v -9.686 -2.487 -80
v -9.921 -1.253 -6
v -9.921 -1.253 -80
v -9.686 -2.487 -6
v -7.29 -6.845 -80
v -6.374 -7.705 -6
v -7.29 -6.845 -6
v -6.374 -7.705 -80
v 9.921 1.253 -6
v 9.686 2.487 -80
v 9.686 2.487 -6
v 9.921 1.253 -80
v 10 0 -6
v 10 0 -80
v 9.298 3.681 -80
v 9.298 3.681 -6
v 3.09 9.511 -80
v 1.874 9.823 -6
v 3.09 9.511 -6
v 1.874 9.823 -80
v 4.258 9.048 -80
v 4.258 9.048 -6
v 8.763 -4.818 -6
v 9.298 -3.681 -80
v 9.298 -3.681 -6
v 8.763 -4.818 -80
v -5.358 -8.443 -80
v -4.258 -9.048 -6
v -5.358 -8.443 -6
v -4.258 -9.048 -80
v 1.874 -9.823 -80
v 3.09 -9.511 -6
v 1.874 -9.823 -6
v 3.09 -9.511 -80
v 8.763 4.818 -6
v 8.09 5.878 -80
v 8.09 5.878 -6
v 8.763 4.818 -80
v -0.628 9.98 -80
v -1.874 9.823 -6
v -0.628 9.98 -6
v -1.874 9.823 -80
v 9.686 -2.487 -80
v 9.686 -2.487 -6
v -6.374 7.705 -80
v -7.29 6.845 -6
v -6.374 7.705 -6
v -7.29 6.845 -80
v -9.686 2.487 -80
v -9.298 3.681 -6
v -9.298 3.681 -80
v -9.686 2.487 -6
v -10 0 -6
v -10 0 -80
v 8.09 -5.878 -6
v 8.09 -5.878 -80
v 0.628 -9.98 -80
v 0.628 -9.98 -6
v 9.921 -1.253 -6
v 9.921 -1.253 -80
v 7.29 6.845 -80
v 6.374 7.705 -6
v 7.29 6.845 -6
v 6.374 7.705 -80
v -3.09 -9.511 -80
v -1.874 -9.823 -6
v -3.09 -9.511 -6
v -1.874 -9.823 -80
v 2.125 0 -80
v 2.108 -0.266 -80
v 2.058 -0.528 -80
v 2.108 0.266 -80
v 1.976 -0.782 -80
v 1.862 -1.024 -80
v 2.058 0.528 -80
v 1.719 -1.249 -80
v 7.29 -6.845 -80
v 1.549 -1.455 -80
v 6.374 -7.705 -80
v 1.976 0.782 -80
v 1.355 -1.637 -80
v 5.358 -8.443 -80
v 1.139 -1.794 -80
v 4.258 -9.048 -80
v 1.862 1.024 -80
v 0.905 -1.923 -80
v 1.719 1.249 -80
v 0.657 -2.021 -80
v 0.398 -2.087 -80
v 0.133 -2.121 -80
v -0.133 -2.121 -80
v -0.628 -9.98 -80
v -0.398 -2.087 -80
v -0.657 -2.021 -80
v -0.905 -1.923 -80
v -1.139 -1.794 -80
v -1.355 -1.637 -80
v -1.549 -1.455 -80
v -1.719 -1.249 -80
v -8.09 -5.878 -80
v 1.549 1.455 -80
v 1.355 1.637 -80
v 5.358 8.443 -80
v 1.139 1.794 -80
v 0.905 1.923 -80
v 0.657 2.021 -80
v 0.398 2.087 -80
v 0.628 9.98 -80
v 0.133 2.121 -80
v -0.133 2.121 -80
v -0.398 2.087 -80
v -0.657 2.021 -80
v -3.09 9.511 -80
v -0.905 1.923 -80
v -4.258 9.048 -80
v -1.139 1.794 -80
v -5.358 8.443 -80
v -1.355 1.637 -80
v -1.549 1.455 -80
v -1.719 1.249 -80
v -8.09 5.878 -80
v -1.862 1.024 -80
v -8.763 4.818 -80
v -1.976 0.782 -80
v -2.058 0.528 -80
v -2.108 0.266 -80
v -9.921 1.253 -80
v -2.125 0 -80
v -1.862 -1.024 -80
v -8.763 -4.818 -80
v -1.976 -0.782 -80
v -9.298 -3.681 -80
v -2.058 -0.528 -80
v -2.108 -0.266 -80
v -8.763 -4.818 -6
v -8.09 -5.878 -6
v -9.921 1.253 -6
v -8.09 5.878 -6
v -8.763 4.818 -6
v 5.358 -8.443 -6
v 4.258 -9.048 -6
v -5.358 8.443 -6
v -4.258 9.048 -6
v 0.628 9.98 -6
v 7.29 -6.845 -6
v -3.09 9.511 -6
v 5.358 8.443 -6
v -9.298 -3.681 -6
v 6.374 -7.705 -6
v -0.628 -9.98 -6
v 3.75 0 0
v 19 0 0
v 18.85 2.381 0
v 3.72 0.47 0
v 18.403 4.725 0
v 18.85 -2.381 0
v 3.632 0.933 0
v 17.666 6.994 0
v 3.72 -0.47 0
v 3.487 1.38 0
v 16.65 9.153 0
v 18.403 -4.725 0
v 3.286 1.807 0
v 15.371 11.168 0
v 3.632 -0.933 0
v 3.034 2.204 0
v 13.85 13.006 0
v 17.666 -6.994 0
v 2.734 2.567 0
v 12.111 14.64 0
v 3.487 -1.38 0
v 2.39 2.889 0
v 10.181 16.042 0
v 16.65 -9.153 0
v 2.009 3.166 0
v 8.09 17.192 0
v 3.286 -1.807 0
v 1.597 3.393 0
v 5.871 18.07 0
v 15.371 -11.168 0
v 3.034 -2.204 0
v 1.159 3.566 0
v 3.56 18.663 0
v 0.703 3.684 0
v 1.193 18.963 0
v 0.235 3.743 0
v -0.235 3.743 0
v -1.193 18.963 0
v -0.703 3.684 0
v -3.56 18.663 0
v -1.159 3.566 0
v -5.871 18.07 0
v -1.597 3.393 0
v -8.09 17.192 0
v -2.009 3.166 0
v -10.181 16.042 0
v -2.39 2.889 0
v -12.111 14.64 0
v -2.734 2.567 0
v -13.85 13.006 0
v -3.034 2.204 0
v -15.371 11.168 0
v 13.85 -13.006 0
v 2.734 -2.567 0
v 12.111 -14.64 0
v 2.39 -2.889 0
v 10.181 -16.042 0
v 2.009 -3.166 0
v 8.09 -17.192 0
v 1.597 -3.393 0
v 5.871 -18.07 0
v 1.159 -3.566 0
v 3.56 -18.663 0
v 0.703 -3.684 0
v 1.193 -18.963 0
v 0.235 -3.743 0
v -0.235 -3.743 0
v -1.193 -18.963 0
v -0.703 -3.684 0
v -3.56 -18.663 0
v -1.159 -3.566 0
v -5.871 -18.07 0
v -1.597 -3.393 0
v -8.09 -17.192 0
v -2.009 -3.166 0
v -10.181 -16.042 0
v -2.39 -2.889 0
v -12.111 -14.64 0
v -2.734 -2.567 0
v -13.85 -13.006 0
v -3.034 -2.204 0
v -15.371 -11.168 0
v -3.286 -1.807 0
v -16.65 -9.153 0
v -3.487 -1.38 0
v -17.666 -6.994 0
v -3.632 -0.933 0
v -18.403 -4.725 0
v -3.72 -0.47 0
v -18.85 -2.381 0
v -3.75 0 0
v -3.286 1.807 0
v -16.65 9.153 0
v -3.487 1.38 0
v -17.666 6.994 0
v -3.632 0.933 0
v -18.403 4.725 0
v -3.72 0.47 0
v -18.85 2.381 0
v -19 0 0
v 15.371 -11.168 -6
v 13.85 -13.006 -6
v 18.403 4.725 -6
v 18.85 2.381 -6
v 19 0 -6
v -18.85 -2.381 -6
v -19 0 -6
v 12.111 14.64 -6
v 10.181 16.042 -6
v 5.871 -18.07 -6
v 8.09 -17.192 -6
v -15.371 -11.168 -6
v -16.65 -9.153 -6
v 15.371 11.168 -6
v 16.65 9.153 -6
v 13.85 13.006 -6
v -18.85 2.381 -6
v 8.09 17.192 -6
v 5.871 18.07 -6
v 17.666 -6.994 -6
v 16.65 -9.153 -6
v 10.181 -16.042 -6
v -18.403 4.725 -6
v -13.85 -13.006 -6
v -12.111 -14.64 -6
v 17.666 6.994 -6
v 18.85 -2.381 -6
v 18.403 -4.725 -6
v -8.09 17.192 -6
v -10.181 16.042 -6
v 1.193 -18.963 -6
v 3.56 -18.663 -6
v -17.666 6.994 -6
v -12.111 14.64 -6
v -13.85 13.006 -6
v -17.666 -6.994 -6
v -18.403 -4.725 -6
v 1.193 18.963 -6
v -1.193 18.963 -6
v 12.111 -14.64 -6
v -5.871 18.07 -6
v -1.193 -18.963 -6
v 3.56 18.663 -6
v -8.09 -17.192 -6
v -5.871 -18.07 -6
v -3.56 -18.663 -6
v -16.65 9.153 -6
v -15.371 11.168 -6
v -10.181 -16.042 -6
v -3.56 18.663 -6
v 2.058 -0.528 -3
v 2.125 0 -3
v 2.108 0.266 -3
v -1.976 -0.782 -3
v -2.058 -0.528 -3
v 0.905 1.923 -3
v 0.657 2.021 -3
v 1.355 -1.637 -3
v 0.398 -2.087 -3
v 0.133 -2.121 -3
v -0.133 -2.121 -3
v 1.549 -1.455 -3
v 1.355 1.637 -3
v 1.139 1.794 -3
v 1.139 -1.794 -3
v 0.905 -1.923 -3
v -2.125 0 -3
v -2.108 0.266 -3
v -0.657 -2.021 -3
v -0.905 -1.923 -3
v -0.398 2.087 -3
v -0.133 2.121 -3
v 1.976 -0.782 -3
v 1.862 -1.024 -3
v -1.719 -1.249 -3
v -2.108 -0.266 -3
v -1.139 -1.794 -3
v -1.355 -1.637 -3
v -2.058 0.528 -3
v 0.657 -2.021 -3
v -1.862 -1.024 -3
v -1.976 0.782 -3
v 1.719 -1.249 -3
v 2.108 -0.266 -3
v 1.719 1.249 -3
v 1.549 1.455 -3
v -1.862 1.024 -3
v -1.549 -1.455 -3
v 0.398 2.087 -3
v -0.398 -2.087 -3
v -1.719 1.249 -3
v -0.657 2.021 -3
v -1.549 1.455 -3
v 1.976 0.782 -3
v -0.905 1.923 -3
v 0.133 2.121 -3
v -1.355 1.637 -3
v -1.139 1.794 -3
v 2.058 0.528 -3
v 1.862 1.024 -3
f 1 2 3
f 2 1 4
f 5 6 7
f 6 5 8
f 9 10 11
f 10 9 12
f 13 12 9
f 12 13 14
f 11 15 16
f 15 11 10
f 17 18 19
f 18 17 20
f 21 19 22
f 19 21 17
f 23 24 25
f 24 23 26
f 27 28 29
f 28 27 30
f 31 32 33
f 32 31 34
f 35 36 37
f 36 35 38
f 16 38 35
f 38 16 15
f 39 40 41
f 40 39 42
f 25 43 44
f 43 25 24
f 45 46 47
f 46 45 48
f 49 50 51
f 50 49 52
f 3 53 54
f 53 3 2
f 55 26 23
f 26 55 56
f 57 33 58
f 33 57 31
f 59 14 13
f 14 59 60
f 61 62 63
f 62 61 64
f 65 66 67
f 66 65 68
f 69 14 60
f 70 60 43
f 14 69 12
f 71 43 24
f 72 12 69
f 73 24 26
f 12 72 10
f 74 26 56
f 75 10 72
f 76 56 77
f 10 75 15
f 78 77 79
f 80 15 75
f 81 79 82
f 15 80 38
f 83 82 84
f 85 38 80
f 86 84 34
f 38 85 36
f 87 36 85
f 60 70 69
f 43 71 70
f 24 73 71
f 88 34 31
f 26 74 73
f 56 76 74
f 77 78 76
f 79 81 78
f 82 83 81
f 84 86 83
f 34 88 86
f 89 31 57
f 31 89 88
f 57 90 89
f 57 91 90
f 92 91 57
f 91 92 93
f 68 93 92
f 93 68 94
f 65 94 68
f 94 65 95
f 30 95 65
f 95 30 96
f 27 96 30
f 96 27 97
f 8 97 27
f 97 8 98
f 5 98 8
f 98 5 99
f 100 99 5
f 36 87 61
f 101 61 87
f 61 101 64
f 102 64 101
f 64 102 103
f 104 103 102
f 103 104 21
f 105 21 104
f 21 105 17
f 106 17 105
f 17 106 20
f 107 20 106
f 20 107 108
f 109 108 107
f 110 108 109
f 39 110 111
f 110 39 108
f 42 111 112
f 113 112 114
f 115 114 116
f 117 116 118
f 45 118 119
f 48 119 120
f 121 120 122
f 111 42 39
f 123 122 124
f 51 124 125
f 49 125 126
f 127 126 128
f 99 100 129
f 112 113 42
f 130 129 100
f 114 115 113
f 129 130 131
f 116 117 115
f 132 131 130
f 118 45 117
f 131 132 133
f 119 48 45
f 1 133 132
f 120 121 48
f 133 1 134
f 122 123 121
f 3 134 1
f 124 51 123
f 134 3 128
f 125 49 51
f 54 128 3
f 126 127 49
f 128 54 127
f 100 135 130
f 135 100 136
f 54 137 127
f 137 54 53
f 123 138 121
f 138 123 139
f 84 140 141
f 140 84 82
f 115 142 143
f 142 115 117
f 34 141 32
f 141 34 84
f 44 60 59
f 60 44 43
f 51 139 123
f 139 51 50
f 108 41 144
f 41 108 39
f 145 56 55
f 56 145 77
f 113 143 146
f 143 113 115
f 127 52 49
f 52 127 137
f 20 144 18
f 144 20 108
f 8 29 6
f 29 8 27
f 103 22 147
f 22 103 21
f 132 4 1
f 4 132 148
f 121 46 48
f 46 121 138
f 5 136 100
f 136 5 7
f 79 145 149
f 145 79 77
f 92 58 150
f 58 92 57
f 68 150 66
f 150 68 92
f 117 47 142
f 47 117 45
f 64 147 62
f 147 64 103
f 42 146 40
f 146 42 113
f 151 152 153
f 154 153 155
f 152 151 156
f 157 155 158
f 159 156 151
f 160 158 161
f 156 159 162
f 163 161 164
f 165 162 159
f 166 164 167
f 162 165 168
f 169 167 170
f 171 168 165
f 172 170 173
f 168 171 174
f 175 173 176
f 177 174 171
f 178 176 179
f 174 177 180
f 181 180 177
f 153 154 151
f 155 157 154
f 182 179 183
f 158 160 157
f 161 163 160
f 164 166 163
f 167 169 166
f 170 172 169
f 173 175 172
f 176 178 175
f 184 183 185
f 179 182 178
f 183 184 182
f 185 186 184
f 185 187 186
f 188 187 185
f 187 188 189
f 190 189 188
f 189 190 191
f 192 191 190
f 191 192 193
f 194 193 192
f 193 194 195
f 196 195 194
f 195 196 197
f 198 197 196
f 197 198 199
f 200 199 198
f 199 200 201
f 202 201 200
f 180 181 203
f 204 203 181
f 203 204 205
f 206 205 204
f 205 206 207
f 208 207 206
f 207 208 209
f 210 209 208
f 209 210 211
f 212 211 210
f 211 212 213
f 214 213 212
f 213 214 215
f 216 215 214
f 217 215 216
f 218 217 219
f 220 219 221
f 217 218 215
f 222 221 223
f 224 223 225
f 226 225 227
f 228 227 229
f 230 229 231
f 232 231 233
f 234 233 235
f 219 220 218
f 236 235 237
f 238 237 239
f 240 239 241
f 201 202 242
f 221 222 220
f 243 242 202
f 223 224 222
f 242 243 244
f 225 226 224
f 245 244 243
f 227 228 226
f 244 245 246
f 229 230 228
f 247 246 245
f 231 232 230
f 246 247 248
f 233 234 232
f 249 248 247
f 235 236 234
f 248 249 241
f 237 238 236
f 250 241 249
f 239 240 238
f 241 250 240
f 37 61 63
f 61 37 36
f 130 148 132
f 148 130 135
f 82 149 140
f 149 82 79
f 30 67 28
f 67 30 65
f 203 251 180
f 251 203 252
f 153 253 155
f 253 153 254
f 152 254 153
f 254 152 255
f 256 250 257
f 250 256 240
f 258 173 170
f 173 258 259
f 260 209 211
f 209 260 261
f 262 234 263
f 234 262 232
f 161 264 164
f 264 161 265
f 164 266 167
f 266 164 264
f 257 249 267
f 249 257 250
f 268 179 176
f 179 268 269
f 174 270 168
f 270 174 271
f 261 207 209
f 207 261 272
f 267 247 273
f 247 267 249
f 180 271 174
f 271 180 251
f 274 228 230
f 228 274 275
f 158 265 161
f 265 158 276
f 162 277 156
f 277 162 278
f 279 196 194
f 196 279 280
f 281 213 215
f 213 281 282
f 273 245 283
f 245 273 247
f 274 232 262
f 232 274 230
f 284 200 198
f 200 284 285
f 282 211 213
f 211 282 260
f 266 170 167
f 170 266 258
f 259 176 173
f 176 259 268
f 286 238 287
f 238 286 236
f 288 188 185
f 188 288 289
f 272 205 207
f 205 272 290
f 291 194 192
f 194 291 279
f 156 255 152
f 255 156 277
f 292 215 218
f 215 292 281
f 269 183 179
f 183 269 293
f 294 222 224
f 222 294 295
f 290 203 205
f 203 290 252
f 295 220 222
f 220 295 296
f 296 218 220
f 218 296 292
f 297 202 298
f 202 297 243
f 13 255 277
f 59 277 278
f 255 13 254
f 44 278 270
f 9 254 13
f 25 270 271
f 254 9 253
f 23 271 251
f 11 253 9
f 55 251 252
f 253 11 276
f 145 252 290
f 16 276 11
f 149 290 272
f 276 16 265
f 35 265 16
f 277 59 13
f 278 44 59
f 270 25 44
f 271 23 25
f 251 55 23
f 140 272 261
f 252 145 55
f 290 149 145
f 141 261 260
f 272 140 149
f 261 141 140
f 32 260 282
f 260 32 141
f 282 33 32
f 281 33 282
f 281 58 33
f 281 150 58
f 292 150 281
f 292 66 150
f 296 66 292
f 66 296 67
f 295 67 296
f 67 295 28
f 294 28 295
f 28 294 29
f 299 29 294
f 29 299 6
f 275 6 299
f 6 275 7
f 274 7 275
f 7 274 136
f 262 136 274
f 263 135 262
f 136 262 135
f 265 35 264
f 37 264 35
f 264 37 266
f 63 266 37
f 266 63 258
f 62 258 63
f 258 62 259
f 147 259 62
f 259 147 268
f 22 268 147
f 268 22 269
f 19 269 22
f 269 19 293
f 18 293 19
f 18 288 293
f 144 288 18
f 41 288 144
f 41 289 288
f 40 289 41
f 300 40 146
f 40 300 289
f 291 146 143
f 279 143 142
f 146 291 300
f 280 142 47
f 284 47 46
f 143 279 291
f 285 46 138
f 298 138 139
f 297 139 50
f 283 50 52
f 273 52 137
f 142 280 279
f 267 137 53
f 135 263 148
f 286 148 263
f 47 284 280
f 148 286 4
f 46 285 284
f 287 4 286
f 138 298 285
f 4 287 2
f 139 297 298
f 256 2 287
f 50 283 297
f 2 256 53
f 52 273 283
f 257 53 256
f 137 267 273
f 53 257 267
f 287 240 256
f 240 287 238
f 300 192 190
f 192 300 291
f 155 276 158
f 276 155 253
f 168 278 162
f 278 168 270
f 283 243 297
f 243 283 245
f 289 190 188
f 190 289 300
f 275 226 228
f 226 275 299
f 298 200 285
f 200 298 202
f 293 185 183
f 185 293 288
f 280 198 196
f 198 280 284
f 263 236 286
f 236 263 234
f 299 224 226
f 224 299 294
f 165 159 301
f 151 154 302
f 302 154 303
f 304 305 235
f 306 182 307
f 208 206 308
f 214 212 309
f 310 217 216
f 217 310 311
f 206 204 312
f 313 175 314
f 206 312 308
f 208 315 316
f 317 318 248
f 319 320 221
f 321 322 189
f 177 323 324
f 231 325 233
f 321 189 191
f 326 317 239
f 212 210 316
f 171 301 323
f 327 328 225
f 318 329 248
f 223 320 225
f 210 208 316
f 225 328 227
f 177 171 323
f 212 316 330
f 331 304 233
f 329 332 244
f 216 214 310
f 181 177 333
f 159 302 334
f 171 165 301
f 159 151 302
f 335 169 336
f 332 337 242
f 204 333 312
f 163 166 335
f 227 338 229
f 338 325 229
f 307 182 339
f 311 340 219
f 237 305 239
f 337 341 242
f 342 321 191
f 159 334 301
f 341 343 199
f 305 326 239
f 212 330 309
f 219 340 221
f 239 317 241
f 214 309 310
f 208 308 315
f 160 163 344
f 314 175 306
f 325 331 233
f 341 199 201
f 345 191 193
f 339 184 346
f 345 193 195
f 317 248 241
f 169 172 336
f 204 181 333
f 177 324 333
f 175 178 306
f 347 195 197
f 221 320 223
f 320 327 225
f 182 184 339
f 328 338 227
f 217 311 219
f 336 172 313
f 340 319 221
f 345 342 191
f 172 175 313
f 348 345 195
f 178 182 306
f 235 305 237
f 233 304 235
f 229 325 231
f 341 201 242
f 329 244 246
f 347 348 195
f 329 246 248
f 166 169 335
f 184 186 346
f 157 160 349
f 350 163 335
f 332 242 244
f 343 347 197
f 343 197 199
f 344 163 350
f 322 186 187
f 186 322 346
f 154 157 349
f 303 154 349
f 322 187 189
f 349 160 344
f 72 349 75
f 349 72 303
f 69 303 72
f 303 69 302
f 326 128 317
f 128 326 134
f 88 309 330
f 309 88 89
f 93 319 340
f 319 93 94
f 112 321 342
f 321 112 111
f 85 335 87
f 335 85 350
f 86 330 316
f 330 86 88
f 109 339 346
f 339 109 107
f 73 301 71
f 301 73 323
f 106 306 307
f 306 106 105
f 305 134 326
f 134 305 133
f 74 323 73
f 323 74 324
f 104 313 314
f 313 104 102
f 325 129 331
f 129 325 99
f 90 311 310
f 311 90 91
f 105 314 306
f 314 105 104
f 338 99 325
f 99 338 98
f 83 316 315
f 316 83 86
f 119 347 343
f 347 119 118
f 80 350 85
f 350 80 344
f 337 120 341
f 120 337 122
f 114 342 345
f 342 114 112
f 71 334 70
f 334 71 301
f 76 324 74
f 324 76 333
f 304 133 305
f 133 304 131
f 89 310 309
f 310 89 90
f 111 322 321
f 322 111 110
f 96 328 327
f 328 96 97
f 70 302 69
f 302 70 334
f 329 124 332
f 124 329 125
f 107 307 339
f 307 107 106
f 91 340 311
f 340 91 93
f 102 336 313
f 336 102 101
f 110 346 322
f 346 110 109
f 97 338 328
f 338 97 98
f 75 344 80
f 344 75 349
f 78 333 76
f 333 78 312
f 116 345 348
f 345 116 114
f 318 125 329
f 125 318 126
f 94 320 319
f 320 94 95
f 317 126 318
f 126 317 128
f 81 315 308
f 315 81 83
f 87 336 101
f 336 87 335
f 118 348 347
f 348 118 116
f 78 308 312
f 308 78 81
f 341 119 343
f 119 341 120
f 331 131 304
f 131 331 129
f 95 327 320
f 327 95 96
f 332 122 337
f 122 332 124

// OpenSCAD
$fn = 50;


difference() {
	union() {
		translate(v = [0, 0, -80.0000000000]) {
			cylinder(h = 80, r = 10.0000000000);
		}
		translate(v = [0, 0, -6.0000000000]) {
			cylinder(h = 6, r = 19.0000000000);
		}
	}
	union() {
		translate(v = [0, 0, 0]) {
			rotate(a = [0, 0, 0]) {
				difference() {
					union() {
						#translate(v = [0, 0, -80.0000000000]) {
							cylinder(h = 80, r = 2.0000000000);
						}
						#translate(v = [0, 0, -3]) {
							cylinder(h = 3, r1 = 2.1250000000, r2 = 3.7500000000);
						}
						#translate(v = [0, 0, -80.0000000000]) {
							cylinder(h = 80, r = 2.1250000000);
						}
						#translate(v = [0, 0, -80.0000000000]) {
							cylinder(h = 80, r = 2.0000000000);
						}
					}
					union();
				}
			}
		}
	}
}
